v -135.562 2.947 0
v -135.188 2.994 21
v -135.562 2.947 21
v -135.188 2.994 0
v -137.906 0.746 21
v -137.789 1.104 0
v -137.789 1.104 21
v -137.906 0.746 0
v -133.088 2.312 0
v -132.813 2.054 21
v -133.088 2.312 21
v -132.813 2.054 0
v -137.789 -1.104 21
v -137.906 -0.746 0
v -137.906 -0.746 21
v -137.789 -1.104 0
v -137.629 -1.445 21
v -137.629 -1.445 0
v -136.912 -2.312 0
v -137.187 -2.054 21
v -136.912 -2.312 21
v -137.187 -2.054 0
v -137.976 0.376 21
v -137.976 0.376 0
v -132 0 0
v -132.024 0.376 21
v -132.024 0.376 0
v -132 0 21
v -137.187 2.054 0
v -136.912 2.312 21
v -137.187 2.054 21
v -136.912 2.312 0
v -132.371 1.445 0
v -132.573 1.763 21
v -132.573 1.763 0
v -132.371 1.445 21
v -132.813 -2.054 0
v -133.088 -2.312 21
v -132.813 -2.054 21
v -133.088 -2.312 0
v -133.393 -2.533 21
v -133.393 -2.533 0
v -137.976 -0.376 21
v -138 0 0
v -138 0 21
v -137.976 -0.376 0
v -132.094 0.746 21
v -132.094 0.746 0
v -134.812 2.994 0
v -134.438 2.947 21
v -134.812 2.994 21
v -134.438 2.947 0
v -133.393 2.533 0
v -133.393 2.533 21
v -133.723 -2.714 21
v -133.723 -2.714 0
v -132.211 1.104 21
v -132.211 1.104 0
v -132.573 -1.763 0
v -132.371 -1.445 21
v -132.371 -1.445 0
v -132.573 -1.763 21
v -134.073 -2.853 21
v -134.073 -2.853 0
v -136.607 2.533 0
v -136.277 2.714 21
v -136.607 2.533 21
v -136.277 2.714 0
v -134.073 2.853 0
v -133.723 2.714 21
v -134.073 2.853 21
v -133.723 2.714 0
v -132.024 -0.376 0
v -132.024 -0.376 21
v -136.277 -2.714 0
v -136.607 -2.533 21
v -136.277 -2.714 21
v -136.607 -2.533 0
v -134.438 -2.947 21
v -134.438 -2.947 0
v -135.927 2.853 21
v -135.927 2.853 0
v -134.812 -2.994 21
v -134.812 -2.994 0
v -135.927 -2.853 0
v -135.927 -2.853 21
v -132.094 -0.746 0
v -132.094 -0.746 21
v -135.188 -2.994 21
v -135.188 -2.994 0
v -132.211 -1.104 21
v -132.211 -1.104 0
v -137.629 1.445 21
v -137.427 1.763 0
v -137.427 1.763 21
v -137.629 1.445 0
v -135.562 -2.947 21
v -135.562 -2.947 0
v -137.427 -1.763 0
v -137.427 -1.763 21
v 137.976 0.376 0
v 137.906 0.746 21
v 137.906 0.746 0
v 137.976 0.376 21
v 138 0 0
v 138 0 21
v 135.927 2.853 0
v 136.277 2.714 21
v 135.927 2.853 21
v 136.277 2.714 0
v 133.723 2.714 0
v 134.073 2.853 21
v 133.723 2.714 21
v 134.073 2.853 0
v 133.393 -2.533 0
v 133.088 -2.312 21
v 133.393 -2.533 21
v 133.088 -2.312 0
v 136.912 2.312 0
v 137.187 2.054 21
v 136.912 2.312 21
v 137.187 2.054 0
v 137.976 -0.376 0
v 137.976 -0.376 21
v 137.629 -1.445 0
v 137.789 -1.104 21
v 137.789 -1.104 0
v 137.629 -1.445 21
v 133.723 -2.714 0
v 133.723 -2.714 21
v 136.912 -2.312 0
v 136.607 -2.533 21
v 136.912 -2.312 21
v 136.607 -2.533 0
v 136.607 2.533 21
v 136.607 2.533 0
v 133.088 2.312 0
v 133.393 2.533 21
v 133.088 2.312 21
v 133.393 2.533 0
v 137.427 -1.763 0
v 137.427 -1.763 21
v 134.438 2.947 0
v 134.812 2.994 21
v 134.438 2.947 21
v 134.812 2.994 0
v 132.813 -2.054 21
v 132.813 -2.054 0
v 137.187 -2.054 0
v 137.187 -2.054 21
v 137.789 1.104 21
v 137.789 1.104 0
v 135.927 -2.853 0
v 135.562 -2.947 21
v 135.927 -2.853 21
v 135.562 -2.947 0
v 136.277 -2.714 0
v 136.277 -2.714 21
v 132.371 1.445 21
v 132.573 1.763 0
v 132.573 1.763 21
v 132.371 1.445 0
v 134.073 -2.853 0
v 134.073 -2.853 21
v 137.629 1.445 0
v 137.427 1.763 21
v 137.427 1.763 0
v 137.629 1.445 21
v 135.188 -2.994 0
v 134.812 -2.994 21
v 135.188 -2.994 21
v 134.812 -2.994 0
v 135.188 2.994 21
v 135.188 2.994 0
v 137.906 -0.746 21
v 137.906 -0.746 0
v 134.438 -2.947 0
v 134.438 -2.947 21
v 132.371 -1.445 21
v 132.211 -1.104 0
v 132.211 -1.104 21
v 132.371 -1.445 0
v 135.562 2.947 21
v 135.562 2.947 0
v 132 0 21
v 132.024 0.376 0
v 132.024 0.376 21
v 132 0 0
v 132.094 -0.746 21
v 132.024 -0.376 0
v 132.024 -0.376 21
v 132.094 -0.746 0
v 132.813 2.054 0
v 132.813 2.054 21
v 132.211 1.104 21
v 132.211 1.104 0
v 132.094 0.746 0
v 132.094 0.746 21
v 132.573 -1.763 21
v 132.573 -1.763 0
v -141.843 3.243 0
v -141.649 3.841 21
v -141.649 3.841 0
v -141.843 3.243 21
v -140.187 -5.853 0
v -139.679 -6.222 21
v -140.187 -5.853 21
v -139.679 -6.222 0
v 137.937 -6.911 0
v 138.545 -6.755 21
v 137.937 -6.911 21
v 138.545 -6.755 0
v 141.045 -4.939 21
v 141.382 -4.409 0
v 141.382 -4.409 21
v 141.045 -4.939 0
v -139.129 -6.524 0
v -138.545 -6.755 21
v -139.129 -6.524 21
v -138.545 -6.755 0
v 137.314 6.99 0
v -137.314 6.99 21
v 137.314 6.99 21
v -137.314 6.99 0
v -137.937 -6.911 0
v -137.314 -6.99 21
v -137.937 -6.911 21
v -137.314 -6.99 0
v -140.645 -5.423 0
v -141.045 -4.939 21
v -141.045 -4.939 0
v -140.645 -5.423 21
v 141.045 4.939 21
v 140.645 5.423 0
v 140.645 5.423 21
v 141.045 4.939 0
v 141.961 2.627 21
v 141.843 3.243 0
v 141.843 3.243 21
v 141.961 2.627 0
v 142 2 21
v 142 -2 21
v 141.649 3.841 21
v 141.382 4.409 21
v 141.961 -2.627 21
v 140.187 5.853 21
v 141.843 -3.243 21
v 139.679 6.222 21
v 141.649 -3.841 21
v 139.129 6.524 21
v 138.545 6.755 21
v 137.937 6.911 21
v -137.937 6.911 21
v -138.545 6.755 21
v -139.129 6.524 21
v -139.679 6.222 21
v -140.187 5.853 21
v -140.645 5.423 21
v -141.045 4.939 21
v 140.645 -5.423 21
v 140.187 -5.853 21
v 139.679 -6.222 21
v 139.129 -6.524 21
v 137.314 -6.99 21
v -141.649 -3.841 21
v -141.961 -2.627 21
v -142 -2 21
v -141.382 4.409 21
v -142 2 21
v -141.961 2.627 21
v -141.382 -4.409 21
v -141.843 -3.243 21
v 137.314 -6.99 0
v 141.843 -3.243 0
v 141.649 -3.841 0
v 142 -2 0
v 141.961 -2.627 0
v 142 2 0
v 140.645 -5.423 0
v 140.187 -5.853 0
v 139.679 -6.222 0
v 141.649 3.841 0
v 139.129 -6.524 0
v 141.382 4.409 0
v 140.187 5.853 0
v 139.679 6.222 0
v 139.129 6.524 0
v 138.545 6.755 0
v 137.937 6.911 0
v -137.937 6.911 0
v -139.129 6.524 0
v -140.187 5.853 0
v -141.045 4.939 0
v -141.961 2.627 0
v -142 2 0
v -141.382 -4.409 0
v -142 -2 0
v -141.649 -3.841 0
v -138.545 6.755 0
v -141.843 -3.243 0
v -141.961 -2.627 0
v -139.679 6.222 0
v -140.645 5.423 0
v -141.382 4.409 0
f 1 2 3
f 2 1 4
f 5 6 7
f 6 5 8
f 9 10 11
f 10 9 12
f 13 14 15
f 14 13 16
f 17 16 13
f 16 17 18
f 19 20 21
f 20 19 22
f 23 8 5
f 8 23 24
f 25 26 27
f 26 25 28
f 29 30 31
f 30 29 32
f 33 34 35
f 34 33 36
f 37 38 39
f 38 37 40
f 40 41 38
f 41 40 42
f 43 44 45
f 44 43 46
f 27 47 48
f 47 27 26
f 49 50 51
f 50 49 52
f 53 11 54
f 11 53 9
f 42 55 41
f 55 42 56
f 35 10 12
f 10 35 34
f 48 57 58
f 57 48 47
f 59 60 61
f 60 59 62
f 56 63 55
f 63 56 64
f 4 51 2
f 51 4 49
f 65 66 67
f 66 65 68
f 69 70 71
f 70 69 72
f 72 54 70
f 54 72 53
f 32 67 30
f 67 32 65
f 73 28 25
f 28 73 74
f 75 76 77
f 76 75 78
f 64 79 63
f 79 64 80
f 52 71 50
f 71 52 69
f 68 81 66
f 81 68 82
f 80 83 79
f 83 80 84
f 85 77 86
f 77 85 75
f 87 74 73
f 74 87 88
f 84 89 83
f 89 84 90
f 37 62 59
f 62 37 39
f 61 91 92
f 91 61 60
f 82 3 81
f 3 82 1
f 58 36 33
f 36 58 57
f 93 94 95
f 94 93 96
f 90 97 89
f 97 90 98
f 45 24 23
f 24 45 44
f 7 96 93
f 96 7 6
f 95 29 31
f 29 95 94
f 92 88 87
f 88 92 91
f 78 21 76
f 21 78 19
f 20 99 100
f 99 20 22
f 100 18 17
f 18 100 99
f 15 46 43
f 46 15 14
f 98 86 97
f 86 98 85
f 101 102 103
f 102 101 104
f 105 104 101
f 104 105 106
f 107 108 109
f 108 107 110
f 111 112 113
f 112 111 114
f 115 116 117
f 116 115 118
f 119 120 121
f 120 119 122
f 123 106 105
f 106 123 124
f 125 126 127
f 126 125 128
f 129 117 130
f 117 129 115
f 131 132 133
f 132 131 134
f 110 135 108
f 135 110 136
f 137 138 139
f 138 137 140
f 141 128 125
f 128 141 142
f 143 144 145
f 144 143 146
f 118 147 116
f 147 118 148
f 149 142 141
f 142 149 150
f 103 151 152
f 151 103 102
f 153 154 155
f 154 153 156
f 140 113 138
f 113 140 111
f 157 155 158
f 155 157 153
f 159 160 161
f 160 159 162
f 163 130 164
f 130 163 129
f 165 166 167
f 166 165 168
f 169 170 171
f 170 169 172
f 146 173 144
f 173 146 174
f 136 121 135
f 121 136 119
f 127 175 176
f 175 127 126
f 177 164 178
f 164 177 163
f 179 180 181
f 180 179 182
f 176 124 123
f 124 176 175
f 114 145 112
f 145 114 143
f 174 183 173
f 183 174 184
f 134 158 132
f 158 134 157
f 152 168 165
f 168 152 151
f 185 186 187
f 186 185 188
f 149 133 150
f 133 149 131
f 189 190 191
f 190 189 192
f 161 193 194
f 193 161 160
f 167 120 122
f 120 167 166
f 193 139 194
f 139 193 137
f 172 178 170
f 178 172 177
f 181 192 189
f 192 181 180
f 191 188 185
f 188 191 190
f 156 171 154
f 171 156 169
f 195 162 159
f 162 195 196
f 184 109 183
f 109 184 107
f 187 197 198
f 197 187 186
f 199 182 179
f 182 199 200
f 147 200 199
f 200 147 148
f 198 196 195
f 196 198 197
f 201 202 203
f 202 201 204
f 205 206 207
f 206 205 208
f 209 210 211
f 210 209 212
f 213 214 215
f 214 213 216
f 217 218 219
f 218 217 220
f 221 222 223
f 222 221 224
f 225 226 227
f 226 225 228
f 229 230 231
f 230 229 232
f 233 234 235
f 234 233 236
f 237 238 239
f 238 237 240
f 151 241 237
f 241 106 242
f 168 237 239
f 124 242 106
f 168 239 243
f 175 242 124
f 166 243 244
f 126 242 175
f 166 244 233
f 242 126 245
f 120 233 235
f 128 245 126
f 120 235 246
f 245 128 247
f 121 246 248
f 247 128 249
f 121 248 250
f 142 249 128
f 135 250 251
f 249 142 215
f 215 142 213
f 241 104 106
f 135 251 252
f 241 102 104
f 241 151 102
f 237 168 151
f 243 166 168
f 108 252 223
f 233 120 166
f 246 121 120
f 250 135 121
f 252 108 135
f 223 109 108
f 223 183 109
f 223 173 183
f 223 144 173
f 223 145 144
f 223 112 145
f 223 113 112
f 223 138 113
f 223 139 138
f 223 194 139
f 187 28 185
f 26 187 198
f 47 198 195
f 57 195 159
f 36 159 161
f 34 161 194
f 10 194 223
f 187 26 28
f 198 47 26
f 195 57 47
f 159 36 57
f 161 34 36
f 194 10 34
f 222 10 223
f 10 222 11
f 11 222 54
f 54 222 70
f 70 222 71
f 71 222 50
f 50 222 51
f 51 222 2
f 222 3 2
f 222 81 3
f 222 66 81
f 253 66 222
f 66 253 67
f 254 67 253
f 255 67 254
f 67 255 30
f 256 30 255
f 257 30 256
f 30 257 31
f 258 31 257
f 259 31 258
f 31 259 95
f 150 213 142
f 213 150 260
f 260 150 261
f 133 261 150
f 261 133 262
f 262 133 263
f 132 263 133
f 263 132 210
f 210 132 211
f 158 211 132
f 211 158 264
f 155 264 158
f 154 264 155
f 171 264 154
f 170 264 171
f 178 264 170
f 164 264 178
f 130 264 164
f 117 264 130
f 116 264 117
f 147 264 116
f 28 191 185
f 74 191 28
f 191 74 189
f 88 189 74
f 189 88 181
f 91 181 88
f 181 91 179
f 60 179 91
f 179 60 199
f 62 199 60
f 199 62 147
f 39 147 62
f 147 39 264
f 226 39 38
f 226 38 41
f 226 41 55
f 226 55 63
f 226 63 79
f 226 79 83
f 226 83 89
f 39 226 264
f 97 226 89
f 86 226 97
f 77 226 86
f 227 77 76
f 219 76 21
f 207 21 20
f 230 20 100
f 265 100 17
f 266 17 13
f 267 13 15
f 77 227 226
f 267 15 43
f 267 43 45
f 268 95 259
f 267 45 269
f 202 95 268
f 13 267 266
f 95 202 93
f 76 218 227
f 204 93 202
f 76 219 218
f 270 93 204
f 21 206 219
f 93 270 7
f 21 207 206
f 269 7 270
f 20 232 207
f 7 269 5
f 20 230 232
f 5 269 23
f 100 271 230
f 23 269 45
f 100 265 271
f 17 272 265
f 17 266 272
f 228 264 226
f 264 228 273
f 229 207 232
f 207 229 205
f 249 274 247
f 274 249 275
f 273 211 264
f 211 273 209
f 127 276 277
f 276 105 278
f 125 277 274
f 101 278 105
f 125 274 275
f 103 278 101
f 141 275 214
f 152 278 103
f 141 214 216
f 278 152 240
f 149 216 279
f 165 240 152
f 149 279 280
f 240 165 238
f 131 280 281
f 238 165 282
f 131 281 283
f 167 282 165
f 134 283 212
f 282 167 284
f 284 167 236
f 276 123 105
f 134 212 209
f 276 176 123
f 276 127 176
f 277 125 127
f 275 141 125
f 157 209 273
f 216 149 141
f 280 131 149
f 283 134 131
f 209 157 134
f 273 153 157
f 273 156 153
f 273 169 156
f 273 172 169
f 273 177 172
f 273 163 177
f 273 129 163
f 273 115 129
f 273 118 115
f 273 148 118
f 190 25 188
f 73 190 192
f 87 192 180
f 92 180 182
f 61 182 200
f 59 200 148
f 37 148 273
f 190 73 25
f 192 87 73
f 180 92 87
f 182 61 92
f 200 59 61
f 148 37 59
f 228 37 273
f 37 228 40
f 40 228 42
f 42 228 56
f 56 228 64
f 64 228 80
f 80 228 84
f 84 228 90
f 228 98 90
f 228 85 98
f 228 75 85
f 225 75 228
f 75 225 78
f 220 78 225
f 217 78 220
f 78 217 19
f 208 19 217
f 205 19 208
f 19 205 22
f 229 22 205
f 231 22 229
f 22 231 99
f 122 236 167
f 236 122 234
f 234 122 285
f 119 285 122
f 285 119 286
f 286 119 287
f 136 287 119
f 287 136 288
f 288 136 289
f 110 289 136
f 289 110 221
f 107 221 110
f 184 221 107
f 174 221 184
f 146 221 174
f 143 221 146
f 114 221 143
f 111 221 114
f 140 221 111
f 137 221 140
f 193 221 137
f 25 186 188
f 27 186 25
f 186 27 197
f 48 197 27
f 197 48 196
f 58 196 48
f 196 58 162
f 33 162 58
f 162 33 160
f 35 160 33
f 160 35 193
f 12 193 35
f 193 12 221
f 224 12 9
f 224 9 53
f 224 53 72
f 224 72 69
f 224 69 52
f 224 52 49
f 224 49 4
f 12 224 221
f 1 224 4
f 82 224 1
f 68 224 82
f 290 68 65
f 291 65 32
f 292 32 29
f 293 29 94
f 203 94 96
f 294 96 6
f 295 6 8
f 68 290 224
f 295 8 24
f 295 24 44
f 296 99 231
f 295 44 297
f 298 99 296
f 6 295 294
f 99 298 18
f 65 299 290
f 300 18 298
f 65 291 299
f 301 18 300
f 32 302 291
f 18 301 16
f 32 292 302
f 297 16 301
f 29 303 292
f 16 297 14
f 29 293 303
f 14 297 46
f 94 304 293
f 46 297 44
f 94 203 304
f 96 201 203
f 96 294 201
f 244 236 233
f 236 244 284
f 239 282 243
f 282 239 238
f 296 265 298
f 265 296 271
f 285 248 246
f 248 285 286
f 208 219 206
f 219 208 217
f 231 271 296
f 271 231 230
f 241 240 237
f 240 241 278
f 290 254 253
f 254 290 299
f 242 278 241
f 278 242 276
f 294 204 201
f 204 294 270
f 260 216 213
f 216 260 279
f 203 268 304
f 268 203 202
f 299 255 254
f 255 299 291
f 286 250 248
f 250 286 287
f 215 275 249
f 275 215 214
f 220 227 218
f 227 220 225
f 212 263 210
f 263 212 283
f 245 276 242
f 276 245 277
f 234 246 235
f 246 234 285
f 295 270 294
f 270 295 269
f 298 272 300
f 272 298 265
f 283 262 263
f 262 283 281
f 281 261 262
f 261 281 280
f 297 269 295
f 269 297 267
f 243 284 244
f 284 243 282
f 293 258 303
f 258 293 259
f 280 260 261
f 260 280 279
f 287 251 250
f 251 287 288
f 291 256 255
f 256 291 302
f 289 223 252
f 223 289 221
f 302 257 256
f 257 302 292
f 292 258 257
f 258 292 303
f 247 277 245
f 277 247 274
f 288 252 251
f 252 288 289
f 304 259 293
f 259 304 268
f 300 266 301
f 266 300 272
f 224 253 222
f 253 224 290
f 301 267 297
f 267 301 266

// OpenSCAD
$fn = 50;


difference() {
	union() {
		hull() {
			translate(v = [-137.0000000000, 2.0000000000, 0]) {
				cylinder(h = 21, r = 5);
			}
			translate(v = [137.0000000000, 2.0000000000, 0]) {
				cylinder(h = 21, r = 5);
			}
			translate(v = [-137.0000000000, -2.0000000000, 0]) {
				cylinder(h = 21, r = 5);
			}
			translate(v = [137.0000000000, -2.0000000000, 0]) {
				cylinder(h = 21, r = 5);
			}
		}
	}
	union() {
		translate(v = [-135.0000000000, 0.0000000000, -100.0000000000]) {
			cylinder(h = 200, r = 3.0000000000);
		}
		translate(v = [-135.0000000000, 0.0000000000, -100.0000000000]) {
			cylinder(h = 200, r = 3.0000000000);
		}
		translate(v = [135.0000000000, 0.0000000000, -100.0000000000]) {
			cylinder(h = 200, r = 3.0000000000);
		}
		translate(v = [135.0000000000, 0.0000000000, -100.0000000000]) {
			cylinder(h = 200, r = 3.0000000000);
		}
	}
}
